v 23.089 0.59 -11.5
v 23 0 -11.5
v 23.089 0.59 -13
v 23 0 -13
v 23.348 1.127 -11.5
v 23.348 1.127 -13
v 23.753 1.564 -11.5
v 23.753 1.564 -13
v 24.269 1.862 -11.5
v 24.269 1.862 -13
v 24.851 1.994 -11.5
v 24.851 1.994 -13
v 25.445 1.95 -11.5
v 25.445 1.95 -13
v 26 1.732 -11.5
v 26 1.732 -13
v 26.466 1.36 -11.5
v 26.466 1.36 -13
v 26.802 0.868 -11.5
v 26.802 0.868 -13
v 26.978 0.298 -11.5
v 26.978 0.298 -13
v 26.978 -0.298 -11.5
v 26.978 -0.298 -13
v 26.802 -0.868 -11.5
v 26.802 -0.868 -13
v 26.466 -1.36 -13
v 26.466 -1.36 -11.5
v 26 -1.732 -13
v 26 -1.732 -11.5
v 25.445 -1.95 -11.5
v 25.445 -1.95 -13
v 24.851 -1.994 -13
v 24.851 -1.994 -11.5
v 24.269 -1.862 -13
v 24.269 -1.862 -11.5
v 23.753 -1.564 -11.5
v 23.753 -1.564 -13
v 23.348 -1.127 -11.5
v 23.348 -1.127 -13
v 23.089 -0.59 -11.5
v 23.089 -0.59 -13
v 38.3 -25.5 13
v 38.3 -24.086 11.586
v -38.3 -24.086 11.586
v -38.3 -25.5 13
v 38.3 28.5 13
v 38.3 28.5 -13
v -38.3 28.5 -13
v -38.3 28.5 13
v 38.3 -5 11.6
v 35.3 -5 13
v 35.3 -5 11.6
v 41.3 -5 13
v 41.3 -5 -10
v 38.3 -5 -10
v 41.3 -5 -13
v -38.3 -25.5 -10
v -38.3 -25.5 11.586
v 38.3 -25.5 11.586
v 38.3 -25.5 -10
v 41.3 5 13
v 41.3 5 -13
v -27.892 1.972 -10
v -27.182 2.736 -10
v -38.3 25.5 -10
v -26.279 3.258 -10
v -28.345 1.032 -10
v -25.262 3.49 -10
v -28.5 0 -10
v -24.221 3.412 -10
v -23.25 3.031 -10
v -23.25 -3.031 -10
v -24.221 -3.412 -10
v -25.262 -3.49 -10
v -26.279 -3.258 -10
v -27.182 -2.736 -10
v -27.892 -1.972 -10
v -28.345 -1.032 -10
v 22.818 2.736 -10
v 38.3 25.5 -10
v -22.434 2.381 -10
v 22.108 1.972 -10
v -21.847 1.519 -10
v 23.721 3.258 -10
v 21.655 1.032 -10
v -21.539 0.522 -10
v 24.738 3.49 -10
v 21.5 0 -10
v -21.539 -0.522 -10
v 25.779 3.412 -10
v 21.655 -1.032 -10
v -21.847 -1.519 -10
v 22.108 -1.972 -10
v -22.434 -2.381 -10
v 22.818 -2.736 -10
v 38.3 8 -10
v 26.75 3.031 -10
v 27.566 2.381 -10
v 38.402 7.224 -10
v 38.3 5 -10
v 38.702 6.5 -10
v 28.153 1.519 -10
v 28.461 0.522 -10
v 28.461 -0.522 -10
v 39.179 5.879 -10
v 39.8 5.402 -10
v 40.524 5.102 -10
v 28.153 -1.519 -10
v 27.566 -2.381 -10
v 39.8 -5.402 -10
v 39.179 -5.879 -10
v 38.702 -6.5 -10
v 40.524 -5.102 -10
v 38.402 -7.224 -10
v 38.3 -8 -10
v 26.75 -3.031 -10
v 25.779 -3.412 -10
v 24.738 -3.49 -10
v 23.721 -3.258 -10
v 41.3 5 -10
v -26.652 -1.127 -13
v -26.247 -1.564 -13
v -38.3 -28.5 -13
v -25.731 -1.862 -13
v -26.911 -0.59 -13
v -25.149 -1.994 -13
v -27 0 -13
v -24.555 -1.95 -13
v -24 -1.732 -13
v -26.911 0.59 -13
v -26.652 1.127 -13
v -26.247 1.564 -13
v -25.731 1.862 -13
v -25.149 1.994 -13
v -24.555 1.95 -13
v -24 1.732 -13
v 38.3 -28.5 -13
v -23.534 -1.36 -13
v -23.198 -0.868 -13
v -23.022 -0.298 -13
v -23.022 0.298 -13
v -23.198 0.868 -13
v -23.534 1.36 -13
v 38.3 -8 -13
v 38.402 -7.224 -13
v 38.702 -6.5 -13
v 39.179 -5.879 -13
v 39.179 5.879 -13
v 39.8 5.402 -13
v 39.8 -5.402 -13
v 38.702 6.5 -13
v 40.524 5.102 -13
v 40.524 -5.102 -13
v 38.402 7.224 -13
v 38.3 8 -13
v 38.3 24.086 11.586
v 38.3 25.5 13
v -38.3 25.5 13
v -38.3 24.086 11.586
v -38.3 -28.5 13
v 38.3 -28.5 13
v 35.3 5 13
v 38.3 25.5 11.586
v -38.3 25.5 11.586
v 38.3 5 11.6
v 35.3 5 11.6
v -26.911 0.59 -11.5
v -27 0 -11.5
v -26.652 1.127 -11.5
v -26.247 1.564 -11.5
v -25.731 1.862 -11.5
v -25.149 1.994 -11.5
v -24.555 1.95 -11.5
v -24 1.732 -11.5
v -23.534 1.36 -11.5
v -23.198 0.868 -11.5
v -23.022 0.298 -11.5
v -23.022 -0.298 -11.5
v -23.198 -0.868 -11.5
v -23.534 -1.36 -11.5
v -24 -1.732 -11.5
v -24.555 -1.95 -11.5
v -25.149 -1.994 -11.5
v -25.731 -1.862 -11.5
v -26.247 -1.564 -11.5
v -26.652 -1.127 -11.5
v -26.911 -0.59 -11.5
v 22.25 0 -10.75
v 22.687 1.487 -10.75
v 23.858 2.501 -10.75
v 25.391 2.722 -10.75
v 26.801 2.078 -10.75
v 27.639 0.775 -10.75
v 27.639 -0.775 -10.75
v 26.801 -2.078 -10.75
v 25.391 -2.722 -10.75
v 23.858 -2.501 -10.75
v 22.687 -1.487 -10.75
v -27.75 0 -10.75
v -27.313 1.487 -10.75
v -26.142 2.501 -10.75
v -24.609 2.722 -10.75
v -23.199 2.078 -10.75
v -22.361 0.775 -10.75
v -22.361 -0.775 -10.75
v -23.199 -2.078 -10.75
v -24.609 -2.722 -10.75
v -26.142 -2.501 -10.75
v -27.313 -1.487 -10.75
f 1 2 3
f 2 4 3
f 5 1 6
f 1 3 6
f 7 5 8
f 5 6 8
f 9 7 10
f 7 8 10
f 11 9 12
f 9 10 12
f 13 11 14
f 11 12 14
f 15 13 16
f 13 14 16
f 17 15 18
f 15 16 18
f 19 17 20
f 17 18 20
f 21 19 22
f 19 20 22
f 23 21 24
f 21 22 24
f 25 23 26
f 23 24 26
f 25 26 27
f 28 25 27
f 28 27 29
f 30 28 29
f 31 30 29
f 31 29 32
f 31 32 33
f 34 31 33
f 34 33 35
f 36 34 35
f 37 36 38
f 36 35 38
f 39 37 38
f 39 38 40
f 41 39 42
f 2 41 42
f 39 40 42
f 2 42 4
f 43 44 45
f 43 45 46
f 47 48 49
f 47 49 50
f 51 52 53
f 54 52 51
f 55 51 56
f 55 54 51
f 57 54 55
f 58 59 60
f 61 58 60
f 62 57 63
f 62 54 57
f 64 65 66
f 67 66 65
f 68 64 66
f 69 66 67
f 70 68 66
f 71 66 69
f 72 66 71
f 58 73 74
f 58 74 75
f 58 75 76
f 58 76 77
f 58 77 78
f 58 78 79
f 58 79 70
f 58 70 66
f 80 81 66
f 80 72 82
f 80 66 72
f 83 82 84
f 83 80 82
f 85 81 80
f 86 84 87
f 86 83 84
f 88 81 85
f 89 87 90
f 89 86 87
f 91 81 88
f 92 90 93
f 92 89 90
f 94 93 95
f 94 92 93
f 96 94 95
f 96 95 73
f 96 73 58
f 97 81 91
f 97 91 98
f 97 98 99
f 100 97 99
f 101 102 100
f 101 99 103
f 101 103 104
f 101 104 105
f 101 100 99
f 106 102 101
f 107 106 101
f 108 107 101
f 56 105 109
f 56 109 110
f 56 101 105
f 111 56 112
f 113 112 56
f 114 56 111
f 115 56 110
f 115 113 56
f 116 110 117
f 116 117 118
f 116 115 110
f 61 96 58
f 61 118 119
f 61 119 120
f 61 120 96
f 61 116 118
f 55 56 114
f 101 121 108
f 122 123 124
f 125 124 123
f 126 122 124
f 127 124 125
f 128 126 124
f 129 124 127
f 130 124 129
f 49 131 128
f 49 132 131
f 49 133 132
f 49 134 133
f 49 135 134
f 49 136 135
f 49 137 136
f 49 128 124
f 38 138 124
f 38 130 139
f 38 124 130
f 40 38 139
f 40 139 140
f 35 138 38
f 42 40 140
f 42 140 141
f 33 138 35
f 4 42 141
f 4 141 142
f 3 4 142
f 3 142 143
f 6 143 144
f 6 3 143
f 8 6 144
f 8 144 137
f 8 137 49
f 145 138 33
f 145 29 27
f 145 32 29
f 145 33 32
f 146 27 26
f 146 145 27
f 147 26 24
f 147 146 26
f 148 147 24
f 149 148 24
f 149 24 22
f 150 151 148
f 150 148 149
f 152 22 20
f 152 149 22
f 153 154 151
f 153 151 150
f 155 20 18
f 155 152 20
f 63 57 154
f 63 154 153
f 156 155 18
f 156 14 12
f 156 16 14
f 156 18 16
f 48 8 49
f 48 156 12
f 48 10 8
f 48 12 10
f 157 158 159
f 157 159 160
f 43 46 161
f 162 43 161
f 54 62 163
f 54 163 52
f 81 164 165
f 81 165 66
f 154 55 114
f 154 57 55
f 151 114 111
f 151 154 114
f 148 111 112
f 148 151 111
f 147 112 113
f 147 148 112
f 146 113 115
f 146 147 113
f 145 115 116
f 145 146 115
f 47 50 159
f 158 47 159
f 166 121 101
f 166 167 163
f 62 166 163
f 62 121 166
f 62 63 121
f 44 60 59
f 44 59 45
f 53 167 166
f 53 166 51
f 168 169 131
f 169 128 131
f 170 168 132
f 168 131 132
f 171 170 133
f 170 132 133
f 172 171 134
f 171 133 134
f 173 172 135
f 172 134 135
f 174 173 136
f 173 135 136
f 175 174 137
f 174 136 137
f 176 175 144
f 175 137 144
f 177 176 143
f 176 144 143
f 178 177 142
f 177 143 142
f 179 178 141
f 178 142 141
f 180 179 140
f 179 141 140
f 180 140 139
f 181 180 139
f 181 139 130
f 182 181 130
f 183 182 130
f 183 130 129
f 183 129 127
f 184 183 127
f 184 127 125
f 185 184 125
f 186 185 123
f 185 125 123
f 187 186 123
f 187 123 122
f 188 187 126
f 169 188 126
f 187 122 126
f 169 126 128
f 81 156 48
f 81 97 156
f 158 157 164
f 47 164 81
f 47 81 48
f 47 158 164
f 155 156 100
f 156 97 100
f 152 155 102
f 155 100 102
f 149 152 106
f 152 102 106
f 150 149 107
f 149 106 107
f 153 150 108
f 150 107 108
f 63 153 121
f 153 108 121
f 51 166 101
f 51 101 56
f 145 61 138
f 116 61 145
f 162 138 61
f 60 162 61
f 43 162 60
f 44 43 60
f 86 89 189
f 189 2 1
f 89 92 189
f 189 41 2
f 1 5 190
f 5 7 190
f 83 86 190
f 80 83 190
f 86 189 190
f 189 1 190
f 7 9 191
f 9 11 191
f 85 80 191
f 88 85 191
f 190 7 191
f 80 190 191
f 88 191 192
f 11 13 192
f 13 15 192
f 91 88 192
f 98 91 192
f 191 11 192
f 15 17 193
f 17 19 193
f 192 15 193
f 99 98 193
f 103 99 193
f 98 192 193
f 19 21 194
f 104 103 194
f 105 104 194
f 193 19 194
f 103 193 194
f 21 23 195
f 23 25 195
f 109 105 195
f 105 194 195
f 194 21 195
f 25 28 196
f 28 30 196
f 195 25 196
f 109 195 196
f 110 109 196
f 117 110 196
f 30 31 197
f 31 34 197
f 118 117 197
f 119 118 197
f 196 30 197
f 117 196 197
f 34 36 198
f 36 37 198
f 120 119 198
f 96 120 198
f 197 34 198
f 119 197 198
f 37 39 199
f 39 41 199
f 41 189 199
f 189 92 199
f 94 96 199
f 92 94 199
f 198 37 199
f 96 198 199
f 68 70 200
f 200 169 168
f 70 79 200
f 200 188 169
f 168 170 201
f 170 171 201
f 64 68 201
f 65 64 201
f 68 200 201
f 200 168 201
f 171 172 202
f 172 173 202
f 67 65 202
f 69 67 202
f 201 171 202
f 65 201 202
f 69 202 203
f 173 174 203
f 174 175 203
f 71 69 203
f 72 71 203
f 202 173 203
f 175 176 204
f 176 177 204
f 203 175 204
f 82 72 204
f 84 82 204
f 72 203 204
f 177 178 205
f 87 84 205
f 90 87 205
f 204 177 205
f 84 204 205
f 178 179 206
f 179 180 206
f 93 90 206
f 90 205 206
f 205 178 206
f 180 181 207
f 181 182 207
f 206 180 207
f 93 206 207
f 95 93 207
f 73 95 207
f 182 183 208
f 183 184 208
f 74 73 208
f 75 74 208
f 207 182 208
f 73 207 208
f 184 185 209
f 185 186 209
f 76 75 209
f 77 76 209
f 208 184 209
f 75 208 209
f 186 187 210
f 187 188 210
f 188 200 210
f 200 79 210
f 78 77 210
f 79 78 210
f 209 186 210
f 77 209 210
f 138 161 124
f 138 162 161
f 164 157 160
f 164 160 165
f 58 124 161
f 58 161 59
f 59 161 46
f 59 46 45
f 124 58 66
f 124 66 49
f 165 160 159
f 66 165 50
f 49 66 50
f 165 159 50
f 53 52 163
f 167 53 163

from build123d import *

# Parameters (mm, degrees)
F1_DEPTH        = 38.3
F2_W            = 76.6
F2_H            = 51
F3_DEPTH        = 19.6
F5_DEPTH        = 76.6
F7_DEPTH        = 3
F8_W            = 10
F8_H            = 21.6
F9_DEPTH        = 3
F10_R           = 2.99999
F12_D           = 4
F12_CSINK_D     = 7
F12_CSINK_ANGLE = 90


# Not quite as in the source:
# - a fillet or chamfer is up to 0.001 mm smaller than in the source, because OpenCascade refuses the exact size


with BuildPart() as f1:
    # F0 (on Right) → F1 (new body, symmetric)
    with BuildSketch(Plane.YZ):
        Polygon((-28.5, 13), (-28.5, -13), (-5, -13), (0, -13), (5, -13), (28.5, -13), (28.5, 13), (5, 13), (-5, 13), align=None)
        Polygon((-5, -10), (-25.5, -10), (-25.5, 10), (-5, 10), (5, 10), (25.5, 10), (25.5, -10), (5, -10), align=None, mode=Mode.SUBTRACT)
    extrude(amount=F1_DEPTH, both=True)

    # F2 (on face) → F3 (cut)
    with BuildSketch(Plane.XY.offset(13)):
        Rectangle(F2_W, F2_H)
    extrude(amount=-F3_DEPTH, mode=Mode.SUBTRACT)

    # F4 (on face) → F5 (join)
    with BuildSketch(Plane.YZ.offset(38.3)):
        Polygon((24.0857864376, 11.5857864376), (25.5, 11.5857864376), (25.5, 13), align=None)
        Polygon((-24.0857864376, 11.5857864376), (-25.5, 13), (-25.5, 11.5857864376), align=None)
    extrude(amount=-F5_DEPTH)

    # F6 (on face) → F7 (join, symmetric)
    with BuildSketch(Plane.YZ.offset(38.3)):
        Polygon((-5, -13), (0, -13), (5, -13), (5, 13), (-5, 13), align=None)
    extrude(amount=F7_DEPTH, both=True)

    # F8 (on face) → F9 (cut)
    with BuildSketch(Plane(origin=(35.3, 0, 0), x_dir=(0, -1, 0), z_dir=(-1, 0, 0))):
        with Locations((0, 0.8)):
            Rectangle(F8_W, F8_H)
    extrude(amount=-F9_DEPTH, mode=Mode.SUBTRACT)

    # F10 (radius 3 in the source; OpenCascade refuses exactly that, so slightly less here)
    f10_edges = [f1.edges().sort_by_distance(p)[0] for p in [
        (38.3, -5, -11.5),
        (38.3, 5, -11.5),
    ]]
    fillet(f10_edges, radius=F10_R)

    # F12 (through all)
    with Locations(Plane.XY.offset(-10)):
        with Locations((-25, 0), (25, 0)):
            CounterSinkHole(F12_D / 2, F12_CSINK_D / 2, counter_sink_angle=F12_CSINK_ANGLE)


solid = f1.part
